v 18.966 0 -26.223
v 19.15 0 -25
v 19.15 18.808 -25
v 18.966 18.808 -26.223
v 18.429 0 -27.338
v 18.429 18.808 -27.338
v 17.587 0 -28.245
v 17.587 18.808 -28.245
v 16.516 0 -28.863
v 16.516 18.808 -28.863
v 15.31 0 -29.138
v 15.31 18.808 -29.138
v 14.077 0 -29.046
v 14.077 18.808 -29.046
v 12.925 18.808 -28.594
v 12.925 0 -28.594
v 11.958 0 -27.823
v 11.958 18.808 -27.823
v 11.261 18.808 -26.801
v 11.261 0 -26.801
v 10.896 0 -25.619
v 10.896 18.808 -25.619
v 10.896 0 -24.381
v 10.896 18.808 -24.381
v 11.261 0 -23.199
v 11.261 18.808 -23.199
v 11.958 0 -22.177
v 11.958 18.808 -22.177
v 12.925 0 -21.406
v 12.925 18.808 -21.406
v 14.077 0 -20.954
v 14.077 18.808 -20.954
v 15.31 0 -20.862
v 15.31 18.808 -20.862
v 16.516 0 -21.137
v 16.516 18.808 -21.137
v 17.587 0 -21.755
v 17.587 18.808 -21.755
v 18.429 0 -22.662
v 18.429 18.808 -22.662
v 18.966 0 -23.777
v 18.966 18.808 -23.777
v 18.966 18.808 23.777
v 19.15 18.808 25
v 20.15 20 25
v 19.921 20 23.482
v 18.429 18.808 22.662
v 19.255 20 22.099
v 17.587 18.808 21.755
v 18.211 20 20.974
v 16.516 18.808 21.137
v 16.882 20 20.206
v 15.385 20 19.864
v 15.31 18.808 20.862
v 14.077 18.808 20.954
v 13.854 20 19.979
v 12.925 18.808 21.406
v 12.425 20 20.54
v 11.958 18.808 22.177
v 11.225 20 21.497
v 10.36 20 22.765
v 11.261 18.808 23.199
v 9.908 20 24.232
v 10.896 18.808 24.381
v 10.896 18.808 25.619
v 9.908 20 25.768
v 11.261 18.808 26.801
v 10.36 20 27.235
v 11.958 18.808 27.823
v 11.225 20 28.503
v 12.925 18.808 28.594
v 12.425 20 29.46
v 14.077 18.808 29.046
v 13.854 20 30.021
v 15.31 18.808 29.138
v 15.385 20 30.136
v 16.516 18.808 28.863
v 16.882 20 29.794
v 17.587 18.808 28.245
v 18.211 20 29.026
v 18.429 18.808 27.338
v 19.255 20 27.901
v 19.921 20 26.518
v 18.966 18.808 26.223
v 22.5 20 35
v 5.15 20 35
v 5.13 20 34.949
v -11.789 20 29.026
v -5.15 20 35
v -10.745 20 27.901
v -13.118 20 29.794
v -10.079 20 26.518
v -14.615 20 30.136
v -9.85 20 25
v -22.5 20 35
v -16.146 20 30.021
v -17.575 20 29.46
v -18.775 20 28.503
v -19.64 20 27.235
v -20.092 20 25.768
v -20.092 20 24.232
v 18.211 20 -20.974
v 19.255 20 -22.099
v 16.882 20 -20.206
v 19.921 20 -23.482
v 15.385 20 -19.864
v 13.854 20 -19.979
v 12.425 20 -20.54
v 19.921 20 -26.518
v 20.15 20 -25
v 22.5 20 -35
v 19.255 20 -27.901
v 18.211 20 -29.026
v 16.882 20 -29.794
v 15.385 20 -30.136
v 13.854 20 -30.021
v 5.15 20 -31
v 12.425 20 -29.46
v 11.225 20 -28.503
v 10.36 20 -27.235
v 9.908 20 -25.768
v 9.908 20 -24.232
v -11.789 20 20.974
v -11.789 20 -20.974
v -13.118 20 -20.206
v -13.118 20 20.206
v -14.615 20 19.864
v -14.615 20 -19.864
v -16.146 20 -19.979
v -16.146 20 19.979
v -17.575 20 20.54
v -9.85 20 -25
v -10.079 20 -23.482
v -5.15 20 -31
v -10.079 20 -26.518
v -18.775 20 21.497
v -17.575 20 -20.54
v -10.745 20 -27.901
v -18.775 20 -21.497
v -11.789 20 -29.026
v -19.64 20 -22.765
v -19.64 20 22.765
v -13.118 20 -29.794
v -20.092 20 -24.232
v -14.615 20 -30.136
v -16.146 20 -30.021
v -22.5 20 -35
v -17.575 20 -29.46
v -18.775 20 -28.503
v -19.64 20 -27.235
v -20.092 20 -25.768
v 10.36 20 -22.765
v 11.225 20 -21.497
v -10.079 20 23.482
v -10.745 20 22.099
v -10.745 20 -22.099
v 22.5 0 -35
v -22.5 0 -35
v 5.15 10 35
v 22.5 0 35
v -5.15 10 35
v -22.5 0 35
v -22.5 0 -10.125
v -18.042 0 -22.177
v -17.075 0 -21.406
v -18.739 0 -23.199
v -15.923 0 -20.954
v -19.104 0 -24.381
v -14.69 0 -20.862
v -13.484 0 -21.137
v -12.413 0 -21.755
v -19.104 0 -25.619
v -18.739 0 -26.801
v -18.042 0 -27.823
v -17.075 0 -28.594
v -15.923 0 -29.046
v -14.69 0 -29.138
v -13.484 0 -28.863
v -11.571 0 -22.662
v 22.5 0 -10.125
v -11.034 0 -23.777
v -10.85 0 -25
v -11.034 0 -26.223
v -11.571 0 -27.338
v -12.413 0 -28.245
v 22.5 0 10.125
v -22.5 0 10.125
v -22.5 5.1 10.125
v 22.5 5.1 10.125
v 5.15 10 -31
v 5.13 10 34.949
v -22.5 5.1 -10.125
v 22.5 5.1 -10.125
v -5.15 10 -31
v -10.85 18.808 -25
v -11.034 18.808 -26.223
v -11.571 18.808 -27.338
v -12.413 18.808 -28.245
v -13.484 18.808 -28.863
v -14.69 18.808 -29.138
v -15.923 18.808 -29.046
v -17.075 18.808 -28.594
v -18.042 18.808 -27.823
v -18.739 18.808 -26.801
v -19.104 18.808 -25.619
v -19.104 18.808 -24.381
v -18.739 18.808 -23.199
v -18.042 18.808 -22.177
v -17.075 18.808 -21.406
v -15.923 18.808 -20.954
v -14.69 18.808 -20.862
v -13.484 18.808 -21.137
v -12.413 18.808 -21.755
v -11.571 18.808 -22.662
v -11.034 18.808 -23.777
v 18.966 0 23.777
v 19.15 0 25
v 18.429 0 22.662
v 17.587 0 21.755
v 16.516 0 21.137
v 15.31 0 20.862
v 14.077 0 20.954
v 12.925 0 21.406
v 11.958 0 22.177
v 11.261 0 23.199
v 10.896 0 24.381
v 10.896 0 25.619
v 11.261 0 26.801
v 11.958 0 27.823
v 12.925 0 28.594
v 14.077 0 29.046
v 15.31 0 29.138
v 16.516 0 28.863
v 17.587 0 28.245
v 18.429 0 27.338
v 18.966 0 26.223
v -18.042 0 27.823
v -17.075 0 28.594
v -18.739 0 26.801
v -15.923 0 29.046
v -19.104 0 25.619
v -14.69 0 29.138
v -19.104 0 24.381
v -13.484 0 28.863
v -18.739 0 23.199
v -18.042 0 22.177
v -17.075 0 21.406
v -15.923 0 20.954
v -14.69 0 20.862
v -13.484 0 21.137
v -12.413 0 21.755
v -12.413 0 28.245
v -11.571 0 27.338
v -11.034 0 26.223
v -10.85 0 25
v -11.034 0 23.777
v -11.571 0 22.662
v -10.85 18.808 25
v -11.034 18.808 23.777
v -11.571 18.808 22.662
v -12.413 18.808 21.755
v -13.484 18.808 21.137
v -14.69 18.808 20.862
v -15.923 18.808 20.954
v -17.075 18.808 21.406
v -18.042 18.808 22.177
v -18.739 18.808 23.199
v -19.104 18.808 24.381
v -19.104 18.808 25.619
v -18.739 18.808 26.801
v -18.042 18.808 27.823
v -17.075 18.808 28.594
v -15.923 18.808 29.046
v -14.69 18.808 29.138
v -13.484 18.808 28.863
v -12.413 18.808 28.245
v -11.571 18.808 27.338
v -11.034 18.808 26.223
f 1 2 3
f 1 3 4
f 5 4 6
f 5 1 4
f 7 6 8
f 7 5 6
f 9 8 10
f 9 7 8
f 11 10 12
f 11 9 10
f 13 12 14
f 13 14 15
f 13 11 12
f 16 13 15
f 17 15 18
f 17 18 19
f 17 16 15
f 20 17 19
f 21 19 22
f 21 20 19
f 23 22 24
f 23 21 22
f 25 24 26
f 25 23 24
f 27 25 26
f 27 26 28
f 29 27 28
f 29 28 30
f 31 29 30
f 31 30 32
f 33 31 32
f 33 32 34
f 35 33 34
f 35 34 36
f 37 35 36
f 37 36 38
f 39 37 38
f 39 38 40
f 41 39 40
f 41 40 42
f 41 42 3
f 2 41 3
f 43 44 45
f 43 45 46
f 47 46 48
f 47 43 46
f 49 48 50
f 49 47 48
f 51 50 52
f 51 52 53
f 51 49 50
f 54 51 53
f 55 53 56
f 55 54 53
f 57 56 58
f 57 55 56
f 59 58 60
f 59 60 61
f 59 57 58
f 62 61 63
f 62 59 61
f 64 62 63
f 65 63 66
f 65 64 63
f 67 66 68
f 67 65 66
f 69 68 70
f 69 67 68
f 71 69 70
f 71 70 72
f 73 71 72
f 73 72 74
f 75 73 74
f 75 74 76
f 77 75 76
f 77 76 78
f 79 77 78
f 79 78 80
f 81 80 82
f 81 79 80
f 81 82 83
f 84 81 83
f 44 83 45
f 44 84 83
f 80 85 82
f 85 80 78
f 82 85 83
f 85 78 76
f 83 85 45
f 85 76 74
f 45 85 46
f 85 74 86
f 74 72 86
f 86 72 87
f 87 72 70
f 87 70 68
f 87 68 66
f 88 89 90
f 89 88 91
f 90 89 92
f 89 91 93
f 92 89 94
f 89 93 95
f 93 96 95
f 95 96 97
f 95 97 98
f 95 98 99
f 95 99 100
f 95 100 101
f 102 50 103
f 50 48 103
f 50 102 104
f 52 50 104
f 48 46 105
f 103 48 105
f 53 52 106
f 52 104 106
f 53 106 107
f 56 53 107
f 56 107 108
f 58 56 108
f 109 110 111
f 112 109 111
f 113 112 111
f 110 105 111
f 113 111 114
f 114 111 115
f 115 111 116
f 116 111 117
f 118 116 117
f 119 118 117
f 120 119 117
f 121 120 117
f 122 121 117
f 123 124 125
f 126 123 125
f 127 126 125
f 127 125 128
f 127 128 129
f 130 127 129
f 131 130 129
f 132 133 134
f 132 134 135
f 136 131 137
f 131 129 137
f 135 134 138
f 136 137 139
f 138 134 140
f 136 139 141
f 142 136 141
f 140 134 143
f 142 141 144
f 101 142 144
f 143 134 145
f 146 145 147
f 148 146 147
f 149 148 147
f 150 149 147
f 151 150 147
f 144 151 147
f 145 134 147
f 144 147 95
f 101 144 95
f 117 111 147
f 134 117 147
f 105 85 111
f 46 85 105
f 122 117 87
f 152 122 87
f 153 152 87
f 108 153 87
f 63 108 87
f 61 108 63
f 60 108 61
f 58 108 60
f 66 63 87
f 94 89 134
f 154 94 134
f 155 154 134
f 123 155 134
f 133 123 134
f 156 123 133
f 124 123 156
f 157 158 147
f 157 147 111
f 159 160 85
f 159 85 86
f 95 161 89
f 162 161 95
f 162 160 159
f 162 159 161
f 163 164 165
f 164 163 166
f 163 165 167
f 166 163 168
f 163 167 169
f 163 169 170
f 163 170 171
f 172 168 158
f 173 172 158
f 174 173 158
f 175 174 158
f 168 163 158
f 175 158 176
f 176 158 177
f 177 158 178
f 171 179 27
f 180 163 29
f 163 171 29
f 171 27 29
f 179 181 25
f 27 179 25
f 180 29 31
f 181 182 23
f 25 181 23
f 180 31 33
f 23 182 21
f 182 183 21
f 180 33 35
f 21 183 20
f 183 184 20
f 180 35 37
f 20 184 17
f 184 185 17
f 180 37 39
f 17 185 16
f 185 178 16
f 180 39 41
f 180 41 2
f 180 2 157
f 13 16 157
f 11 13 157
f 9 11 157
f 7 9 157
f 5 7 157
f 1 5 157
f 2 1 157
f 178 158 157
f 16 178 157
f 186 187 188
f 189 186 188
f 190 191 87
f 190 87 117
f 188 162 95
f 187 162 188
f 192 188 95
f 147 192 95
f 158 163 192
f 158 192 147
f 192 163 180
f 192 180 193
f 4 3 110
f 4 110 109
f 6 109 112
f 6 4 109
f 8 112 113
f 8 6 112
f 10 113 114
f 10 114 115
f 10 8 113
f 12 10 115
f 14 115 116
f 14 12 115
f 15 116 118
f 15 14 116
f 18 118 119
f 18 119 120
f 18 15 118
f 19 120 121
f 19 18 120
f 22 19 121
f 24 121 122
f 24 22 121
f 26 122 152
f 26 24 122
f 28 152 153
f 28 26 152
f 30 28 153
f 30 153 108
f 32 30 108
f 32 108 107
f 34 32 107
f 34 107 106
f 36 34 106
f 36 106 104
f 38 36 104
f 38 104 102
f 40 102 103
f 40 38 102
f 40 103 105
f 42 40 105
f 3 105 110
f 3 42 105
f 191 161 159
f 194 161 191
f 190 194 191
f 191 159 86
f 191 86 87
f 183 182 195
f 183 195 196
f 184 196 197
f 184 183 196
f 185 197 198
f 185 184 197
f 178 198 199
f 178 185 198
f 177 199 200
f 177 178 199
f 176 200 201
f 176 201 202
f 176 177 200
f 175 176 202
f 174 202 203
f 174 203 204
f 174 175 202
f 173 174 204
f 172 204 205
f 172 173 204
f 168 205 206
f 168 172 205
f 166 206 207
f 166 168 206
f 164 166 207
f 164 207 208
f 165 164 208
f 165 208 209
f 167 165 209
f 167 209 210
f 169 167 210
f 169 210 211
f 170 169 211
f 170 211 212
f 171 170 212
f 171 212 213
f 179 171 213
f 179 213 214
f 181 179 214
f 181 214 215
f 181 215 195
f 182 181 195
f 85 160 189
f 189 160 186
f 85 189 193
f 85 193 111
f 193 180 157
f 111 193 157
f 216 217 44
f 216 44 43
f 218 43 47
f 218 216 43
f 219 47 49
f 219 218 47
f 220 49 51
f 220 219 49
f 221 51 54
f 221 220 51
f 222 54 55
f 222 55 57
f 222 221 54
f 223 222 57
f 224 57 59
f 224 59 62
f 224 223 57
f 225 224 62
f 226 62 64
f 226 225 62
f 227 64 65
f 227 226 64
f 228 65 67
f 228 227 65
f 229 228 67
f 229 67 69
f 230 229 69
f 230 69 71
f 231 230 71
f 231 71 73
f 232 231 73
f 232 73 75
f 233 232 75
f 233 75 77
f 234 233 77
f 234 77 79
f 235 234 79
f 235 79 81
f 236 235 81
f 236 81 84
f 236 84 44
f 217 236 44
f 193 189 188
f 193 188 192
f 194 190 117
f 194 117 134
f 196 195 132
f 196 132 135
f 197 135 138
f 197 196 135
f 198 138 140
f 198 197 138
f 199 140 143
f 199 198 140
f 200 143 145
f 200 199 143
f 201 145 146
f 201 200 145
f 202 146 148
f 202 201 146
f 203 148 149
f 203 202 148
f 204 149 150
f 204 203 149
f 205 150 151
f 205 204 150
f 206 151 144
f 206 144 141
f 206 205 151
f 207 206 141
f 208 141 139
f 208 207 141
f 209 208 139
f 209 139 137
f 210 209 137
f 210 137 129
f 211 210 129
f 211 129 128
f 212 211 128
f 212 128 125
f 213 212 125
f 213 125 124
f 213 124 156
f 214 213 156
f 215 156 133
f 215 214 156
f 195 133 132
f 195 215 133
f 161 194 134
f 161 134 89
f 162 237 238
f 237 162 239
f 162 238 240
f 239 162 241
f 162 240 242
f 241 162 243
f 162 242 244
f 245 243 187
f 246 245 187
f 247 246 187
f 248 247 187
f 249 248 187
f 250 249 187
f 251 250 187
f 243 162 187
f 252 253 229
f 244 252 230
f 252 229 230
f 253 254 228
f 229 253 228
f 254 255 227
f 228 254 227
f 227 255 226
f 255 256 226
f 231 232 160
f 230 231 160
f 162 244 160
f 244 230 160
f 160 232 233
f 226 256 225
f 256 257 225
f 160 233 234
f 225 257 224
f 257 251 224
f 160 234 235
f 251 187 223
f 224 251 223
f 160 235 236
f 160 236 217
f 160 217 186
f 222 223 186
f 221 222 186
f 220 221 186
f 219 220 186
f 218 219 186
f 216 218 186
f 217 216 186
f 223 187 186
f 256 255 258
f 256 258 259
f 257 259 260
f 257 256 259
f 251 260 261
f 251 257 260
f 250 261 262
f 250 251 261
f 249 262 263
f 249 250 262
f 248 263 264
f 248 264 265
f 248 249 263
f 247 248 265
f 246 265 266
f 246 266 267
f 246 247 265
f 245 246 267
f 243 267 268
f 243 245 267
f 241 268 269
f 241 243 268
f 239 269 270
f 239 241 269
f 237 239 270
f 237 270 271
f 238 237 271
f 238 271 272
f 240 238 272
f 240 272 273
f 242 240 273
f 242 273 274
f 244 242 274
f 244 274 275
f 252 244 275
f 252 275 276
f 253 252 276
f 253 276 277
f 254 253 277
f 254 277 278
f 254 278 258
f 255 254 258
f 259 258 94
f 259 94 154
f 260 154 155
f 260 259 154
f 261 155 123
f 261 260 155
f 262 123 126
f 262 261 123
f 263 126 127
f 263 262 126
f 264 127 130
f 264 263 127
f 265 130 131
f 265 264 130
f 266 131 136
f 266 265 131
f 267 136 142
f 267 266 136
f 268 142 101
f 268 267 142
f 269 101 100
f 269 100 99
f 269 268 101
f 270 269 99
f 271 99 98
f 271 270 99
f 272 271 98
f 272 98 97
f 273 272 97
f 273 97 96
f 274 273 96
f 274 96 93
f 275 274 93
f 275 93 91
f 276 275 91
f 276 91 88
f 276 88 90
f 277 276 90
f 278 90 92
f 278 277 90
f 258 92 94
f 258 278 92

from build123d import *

# Parameters (mm, degrees)
SKETCH1_W               = 45
SKETCH1_H               = 70
BOSS_EXTRUDE1_DEPTH     = 10
SKETCH2_W               = 20.25
SKETCH2_H               = 5.1
CUT_EXTRUDE1_DEPTH      = 1
CUT_EXTRUDE1_DEPTH_BACK = 46
SKETCH3_R               = 4.15
CUT_EXTRUDE2_DEPTH      = 11
SKETCH5_R               = 4.15
BOSS_EXTRUDE2_DEPTH     = 10
CHAMFER1_SIZE           = 1
CHAMFER1_SIZE2          = 1.191753593


with BuildPart() as part:
    # Sketch1 → Boss-Extrude1 (new body)
    with BuildSketch(Plane(origin=(0, 0, 0), x_dir=(1, 0, 0), z_dir=(0, 1, 0))):
        Rectangle(SKETCH1_W, SKETCH1_H)
    extrude(amount=BOSS_EXTRUDE1_DEPTH)

    # Sketch2 → Cut-Extrude1 (cut, two sides)
    with BuildSketch(Plane(origin=(22.5, 0, 0), x_dir=(0, 0, -1), z_dir=(1, 0, 0))) as cut_extrude1_sk:
        with Locations((0, 2.55)):
            Rectangle(SKETCH2_W, SKETCH2_H)
    extrude(amount=CUT_EXTRUDE1_DEPTH, mode=Mode.SUBTRACT)
    extrude(cut_extrude1_sk.sketch, amount=-CUT_EXTRUDE1_DEPTH_BACK, mode=Mode.SUBTRACT)

    # Sketch3 → Cut-Extrude2 (cut, through all)
    with BuildSketch(Plane.XZ):
        with Locations((15, 25)):
            Circle(SKETCH3_R)
        with Locations((15, -25)):
            Circle(SKETCH3_R)
        with Locations((-15, -25)):
            Circle(SKETCH3_R)
        with Locations((-15, 25)):
            Circle(SKETCH3_R)
    extrude(amount=-CUT_EXTRUDE2_DEPTH, mode=Mode.SUBTRACT)

    # Sketch5 → Boss-Extrude2 (add)
    with BuildSketch(Plane(origin=(0, 10, 0), x_dir=(1, 0, 0), z_dir=(0, 1, 0))):
        Polygon((-5.15, -35), (-22.5, -35), (-22.5, 35), (22.5, 35), (22.5, -35), (5.15, -35), (5.130229348, -34.949305848), (5.15, 31), (-5.15, 31), align=None)
        with Locations((-15, 25)):
            Circle(SKETCH5_R, mode=Mode.SUBTRACT)
        with Locations((15, 25)):
            Circle(SKETCH5_R, mode=Mode.SUBTRACT)
        with Locations((15, -25)):
            Circle(SKETCH5_R, mode=Mode.SUBTRACT)
        with Locations((-15, -25)):
            Circle(SKETCH5_R, mode=Mode.SUBTRACT)
    extrude(amount=BOSS_EXTRUDE2_DEPTH)

    # Chamfer1
    chamfer1_edges = [part.edges().sort_by_distance(p)[0] for p in [
        (-19.15, 20, -25),
        (10.85, 20, -25),
        (10.85, 20, 25),
        (-19.15, 20, 25),
    ]]
    chamfer1_side = [part.faces().sort_by_distance(p)[0] for p in [
        (-13.825, 20, 34.167834151),
    ]]
    chamfer(chamfer1_edges, length=CHAMFER1_SIZE, length2=CHAMFER1_SIZE2, reference=chamfer1_side[0])


solid = part.part
